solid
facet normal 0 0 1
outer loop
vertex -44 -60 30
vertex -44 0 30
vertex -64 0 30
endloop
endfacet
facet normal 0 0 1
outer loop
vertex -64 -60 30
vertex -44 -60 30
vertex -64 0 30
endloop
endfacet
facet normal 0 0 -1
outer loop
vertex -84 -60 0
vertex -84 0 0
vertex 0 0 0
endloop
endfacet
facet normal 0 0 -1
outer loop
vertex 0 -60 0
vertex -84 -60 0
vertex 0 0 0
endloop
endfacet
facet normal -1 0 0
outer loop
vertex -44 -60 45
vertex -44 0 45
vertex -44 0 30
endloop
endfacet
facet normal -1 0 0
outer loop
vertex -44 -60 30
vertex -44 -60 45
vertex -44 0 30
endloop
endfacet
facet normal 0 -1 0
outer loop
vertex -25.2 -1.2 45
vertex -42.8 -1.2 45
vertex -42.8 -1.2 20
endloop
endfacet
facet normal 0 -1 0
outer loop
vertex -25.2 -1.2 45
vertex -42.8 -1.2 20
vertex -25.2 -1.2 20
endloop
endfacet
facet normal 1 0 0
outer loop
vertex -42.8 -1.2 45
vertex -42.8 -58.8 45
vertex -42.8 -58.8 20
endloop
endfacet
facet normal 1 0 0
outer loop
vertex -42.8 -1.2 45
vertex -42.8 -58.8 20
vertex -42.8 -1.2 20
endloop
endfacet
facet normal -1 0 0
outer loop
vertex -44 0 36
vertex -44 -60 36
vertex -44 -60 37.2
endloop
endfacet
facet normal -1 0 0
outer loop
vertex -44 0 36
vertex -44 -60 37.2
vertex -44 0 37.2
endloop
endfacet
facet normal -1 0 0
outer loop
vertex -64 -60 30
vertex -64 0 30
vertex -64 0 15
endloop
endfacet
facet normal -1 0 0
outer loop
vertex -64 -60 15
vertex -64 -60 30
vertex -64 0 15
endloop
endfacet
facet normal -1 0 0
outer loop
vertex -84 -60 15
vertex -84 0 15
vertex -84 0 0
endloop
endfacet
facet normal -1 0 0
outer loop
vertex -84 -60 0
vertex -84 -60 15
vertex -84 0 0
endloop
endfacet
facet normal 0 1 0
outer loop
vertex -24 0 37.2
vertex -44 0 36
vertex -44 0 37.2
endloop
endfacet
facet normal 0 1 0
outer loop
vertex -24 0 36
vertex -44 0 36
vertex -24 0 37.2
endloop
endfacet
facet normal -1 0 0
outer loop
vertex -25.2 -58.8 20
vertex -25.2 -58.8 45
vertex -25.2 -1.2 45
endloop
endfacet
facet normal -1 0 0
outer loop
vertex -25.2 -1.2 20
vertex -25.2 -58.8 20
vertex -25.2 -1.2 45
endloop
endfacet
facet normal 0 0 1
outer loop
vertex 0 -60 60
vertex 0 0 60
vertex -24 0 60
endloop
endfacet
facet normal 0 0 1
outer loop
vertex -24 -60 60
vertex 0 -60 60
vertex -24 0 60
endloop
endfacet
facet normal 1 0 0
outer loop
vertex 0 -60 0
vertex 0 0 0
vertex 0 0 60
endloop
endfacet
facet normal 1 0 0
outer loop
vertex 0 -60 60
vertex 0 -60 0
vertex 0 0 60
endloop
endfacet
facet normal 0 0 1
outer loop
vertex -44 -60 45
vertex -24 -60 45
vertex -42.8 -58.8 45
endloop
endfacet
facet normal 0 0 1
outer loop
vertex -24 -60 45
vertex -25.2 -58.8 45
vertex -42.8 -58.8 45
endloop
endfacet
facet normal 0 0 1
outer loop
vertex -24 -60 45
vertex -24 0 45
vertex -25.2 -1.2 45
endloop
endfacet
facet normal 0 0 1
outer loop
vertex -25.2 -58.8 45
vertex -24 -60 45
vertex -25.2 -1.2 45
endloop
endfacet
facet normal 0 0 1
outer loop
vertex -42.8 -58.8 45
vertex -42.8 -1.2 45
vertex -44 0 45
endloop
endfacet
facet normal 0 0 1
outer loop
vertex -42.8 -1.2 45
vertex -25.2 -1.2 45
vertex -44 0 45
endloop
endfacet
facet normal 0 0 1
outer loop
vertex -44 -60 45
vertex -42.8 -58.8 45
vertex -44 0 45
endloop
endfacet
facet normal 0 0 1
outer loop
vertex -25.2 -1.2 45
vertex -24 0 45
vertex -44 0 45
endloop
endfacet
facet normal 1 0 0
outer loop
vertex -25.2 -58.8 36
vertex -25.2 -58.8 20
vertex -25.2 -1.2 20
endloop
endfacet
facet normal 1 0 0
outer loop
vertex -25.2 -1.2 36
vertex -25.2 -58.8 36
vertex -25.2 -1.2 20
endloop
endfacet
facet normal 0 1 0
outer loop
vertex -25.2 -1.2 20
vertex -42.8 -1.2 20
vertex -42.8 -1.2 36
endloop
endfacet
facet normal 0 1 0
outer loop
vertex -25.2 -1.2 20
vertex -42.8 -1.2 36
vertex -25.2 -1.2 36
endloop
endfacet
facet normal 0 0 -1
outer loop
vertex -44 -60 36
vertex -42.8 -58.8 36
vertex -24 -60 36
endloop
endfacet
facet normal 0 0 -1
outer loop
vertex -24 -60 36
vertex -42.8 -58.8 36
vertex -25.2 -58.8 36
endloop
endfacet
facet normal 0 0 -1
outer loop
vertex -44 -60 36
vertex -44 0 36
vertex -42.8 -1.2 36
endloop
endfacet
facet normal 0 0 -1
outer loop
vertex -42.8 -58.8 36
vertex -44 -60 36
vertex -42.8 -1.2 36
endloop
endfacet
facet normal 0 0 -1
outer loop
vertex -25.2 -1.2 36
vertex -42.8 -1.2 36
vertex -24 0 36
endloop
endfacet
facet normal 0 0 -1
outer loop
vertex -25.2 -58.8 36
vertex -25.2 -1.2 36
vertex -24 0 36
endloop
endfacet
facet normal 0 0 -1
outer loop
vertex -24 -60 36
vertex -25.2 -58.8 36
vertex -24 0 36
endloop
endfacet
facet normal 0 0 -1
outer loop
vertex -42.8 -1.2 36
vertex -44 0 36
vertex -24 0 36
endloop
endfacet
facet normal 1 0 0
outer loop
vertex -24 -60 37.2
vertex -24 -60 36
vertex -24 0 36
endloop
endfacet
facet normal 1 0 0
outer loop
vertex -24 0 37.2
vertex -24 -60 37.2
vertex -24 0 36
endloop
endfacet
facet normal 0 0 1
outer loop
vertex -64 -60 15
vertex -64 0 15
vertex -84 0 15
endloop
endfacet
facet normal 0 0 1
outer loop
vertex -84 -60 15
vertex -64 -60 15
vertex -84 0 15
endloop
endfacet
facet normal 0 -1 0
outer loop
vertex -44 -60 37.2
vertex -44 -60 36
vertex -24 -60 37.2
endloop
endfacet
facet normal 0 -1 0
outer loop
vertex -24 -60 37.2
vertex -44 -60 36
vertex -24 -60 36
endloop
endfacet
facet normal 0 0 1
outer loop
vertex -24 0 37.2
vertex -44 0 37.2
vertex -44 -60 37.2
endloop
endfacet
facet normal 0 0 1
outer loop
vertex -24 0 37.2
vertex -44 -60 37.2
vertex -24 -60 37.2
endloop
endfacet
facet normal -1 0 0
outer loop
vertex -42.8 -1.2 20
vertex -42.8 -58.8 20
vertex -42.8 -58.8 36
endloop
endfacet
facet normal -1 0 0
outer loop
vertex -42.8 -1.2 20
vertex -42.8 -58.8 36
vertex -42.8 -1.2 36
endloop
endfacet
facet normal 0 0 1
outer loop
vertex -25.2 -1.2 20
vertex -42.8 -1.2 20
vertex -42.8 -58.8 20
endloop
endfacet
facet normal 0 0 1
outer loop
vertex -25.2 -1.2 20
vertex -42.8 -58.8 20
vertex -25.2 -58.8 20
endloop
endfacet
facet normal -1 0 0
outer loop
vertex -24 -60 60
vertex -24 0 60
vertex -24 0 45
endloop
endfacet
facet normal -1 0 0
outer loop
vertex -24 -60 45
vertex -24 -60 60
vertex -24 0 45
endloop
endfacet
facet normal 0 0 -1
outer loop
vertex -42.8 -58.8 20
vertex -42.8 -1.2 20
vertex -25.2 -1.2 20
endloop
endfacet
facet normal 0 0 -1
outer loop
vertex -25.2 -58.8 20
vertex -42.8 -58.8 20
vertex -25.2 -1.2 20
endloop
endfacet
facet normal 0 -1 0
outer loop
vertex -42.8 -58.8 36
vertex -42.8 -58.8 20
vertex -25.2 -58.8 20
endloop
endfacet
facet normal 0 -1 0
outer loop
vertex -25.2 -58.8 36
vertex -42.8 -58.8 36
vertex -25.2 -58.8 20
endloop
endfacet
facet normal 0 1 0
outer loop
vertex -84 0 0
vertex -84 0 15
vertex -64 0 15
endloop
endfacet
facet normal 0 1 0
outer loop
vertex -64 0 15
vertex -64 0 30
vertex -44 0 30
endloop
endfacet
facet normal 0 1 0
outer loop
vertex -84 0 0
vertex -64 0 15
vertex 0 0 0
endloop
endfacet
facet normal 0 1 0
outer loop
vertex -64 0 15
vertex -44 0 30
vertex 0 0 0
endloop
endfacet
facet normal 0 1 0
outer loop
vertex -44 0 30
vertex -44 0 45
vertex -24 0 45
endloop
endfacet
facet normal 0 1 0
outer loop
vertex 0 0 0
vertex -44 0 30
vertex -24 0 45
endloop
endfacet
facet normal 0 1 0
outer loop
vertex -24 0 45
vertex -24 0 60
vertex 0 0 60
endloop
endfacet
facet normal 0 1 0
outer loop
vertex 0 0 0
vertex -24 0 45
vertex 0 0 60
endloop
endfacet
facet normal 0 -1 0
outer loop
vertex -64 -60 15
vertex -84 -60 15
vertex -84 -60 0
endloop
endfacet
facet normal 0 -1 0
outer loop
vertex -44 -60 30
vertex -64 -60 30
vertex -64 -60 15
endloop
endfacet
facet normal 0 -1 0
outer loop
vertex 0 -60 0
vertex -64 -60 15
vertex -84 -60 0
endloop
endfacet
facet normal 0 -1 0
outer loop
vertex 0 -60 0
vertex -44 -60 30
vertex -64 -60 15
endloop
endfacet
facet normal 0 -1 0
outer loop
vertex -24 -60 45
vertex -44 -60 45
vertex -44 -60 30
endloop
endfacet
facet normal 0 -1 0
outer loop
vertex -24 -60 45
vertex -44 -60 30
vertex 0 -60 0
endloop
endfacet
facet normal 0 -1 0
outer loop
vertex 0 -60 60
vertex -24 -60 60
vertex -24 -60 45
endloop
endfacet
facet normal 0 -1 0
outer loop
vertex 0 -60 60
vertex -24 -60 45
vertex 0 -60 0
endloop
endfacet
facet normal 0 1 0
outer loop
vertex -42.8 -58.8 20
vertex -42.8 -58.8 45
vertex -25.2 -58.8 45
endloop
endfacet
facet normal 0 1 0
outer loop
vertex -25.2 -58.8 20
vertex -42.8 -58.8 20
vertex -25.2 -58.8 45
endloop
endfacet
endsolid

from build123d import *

# Parameters (mm, degrees)
F1_DEPTH = 60
F2_W     = 17.6
F2_H     = 57.6
F3_DEPTH = 25
F4_DEPTH = 16
F5_W     = 20
F5_H     = 60
F5_W_2   = 17.6
F5_H_2   = 57.6
F6_DEPTH = 1.2


with BuildPart() as f1:
    # F0 (on Front) → F1 (new body)
    with BuildSketch(Plane.XZ):
        Polygon((-84, 0), (0, 0), (0, 60), (-24, 60), (-24, 45), (-44, 45), (-44, 30), (-64, 30), (-64, 15), (-84, 15), align=None)
    extrude(amount=F1_DEPTH)

    # F2 (on face) → F3 (cut)
    with BuildSketch(Plane.XY.offset(45)):
        with Locations((-34, -30)):
            Rectangle(F2_W, F2_H)
    extrude(amount=-F3_DEPTH, mode=Mode.SUBTRACT)


with BuildPart() as f4:
    # F4 (new): a face of the model
    f4_faces = [f1.part.faces().sort_by_distance(p)[0] for p in [
        (-34, -30, 20),
    ]]
    extrude(f4_faces, amount=F4_DEPTH)

    # F5 (on face) → F6 (join)
    with BuildSketch(Plane.XY.offset(36)):
        with Locations((-34, -30)):
            Rectangle(F5_W, F5_H)
        with Locations((-34, -30)):
            Rectangle(F5_W_2, F5_H_2, mode=Mode.SUBTRACT)
        with Locations((-34, -30)):
            Rectangle(F5_W_2, F5_H_2)
    extrude(amount=F6_DEPTH)


solid = Compound([f1.part, f4.part])
